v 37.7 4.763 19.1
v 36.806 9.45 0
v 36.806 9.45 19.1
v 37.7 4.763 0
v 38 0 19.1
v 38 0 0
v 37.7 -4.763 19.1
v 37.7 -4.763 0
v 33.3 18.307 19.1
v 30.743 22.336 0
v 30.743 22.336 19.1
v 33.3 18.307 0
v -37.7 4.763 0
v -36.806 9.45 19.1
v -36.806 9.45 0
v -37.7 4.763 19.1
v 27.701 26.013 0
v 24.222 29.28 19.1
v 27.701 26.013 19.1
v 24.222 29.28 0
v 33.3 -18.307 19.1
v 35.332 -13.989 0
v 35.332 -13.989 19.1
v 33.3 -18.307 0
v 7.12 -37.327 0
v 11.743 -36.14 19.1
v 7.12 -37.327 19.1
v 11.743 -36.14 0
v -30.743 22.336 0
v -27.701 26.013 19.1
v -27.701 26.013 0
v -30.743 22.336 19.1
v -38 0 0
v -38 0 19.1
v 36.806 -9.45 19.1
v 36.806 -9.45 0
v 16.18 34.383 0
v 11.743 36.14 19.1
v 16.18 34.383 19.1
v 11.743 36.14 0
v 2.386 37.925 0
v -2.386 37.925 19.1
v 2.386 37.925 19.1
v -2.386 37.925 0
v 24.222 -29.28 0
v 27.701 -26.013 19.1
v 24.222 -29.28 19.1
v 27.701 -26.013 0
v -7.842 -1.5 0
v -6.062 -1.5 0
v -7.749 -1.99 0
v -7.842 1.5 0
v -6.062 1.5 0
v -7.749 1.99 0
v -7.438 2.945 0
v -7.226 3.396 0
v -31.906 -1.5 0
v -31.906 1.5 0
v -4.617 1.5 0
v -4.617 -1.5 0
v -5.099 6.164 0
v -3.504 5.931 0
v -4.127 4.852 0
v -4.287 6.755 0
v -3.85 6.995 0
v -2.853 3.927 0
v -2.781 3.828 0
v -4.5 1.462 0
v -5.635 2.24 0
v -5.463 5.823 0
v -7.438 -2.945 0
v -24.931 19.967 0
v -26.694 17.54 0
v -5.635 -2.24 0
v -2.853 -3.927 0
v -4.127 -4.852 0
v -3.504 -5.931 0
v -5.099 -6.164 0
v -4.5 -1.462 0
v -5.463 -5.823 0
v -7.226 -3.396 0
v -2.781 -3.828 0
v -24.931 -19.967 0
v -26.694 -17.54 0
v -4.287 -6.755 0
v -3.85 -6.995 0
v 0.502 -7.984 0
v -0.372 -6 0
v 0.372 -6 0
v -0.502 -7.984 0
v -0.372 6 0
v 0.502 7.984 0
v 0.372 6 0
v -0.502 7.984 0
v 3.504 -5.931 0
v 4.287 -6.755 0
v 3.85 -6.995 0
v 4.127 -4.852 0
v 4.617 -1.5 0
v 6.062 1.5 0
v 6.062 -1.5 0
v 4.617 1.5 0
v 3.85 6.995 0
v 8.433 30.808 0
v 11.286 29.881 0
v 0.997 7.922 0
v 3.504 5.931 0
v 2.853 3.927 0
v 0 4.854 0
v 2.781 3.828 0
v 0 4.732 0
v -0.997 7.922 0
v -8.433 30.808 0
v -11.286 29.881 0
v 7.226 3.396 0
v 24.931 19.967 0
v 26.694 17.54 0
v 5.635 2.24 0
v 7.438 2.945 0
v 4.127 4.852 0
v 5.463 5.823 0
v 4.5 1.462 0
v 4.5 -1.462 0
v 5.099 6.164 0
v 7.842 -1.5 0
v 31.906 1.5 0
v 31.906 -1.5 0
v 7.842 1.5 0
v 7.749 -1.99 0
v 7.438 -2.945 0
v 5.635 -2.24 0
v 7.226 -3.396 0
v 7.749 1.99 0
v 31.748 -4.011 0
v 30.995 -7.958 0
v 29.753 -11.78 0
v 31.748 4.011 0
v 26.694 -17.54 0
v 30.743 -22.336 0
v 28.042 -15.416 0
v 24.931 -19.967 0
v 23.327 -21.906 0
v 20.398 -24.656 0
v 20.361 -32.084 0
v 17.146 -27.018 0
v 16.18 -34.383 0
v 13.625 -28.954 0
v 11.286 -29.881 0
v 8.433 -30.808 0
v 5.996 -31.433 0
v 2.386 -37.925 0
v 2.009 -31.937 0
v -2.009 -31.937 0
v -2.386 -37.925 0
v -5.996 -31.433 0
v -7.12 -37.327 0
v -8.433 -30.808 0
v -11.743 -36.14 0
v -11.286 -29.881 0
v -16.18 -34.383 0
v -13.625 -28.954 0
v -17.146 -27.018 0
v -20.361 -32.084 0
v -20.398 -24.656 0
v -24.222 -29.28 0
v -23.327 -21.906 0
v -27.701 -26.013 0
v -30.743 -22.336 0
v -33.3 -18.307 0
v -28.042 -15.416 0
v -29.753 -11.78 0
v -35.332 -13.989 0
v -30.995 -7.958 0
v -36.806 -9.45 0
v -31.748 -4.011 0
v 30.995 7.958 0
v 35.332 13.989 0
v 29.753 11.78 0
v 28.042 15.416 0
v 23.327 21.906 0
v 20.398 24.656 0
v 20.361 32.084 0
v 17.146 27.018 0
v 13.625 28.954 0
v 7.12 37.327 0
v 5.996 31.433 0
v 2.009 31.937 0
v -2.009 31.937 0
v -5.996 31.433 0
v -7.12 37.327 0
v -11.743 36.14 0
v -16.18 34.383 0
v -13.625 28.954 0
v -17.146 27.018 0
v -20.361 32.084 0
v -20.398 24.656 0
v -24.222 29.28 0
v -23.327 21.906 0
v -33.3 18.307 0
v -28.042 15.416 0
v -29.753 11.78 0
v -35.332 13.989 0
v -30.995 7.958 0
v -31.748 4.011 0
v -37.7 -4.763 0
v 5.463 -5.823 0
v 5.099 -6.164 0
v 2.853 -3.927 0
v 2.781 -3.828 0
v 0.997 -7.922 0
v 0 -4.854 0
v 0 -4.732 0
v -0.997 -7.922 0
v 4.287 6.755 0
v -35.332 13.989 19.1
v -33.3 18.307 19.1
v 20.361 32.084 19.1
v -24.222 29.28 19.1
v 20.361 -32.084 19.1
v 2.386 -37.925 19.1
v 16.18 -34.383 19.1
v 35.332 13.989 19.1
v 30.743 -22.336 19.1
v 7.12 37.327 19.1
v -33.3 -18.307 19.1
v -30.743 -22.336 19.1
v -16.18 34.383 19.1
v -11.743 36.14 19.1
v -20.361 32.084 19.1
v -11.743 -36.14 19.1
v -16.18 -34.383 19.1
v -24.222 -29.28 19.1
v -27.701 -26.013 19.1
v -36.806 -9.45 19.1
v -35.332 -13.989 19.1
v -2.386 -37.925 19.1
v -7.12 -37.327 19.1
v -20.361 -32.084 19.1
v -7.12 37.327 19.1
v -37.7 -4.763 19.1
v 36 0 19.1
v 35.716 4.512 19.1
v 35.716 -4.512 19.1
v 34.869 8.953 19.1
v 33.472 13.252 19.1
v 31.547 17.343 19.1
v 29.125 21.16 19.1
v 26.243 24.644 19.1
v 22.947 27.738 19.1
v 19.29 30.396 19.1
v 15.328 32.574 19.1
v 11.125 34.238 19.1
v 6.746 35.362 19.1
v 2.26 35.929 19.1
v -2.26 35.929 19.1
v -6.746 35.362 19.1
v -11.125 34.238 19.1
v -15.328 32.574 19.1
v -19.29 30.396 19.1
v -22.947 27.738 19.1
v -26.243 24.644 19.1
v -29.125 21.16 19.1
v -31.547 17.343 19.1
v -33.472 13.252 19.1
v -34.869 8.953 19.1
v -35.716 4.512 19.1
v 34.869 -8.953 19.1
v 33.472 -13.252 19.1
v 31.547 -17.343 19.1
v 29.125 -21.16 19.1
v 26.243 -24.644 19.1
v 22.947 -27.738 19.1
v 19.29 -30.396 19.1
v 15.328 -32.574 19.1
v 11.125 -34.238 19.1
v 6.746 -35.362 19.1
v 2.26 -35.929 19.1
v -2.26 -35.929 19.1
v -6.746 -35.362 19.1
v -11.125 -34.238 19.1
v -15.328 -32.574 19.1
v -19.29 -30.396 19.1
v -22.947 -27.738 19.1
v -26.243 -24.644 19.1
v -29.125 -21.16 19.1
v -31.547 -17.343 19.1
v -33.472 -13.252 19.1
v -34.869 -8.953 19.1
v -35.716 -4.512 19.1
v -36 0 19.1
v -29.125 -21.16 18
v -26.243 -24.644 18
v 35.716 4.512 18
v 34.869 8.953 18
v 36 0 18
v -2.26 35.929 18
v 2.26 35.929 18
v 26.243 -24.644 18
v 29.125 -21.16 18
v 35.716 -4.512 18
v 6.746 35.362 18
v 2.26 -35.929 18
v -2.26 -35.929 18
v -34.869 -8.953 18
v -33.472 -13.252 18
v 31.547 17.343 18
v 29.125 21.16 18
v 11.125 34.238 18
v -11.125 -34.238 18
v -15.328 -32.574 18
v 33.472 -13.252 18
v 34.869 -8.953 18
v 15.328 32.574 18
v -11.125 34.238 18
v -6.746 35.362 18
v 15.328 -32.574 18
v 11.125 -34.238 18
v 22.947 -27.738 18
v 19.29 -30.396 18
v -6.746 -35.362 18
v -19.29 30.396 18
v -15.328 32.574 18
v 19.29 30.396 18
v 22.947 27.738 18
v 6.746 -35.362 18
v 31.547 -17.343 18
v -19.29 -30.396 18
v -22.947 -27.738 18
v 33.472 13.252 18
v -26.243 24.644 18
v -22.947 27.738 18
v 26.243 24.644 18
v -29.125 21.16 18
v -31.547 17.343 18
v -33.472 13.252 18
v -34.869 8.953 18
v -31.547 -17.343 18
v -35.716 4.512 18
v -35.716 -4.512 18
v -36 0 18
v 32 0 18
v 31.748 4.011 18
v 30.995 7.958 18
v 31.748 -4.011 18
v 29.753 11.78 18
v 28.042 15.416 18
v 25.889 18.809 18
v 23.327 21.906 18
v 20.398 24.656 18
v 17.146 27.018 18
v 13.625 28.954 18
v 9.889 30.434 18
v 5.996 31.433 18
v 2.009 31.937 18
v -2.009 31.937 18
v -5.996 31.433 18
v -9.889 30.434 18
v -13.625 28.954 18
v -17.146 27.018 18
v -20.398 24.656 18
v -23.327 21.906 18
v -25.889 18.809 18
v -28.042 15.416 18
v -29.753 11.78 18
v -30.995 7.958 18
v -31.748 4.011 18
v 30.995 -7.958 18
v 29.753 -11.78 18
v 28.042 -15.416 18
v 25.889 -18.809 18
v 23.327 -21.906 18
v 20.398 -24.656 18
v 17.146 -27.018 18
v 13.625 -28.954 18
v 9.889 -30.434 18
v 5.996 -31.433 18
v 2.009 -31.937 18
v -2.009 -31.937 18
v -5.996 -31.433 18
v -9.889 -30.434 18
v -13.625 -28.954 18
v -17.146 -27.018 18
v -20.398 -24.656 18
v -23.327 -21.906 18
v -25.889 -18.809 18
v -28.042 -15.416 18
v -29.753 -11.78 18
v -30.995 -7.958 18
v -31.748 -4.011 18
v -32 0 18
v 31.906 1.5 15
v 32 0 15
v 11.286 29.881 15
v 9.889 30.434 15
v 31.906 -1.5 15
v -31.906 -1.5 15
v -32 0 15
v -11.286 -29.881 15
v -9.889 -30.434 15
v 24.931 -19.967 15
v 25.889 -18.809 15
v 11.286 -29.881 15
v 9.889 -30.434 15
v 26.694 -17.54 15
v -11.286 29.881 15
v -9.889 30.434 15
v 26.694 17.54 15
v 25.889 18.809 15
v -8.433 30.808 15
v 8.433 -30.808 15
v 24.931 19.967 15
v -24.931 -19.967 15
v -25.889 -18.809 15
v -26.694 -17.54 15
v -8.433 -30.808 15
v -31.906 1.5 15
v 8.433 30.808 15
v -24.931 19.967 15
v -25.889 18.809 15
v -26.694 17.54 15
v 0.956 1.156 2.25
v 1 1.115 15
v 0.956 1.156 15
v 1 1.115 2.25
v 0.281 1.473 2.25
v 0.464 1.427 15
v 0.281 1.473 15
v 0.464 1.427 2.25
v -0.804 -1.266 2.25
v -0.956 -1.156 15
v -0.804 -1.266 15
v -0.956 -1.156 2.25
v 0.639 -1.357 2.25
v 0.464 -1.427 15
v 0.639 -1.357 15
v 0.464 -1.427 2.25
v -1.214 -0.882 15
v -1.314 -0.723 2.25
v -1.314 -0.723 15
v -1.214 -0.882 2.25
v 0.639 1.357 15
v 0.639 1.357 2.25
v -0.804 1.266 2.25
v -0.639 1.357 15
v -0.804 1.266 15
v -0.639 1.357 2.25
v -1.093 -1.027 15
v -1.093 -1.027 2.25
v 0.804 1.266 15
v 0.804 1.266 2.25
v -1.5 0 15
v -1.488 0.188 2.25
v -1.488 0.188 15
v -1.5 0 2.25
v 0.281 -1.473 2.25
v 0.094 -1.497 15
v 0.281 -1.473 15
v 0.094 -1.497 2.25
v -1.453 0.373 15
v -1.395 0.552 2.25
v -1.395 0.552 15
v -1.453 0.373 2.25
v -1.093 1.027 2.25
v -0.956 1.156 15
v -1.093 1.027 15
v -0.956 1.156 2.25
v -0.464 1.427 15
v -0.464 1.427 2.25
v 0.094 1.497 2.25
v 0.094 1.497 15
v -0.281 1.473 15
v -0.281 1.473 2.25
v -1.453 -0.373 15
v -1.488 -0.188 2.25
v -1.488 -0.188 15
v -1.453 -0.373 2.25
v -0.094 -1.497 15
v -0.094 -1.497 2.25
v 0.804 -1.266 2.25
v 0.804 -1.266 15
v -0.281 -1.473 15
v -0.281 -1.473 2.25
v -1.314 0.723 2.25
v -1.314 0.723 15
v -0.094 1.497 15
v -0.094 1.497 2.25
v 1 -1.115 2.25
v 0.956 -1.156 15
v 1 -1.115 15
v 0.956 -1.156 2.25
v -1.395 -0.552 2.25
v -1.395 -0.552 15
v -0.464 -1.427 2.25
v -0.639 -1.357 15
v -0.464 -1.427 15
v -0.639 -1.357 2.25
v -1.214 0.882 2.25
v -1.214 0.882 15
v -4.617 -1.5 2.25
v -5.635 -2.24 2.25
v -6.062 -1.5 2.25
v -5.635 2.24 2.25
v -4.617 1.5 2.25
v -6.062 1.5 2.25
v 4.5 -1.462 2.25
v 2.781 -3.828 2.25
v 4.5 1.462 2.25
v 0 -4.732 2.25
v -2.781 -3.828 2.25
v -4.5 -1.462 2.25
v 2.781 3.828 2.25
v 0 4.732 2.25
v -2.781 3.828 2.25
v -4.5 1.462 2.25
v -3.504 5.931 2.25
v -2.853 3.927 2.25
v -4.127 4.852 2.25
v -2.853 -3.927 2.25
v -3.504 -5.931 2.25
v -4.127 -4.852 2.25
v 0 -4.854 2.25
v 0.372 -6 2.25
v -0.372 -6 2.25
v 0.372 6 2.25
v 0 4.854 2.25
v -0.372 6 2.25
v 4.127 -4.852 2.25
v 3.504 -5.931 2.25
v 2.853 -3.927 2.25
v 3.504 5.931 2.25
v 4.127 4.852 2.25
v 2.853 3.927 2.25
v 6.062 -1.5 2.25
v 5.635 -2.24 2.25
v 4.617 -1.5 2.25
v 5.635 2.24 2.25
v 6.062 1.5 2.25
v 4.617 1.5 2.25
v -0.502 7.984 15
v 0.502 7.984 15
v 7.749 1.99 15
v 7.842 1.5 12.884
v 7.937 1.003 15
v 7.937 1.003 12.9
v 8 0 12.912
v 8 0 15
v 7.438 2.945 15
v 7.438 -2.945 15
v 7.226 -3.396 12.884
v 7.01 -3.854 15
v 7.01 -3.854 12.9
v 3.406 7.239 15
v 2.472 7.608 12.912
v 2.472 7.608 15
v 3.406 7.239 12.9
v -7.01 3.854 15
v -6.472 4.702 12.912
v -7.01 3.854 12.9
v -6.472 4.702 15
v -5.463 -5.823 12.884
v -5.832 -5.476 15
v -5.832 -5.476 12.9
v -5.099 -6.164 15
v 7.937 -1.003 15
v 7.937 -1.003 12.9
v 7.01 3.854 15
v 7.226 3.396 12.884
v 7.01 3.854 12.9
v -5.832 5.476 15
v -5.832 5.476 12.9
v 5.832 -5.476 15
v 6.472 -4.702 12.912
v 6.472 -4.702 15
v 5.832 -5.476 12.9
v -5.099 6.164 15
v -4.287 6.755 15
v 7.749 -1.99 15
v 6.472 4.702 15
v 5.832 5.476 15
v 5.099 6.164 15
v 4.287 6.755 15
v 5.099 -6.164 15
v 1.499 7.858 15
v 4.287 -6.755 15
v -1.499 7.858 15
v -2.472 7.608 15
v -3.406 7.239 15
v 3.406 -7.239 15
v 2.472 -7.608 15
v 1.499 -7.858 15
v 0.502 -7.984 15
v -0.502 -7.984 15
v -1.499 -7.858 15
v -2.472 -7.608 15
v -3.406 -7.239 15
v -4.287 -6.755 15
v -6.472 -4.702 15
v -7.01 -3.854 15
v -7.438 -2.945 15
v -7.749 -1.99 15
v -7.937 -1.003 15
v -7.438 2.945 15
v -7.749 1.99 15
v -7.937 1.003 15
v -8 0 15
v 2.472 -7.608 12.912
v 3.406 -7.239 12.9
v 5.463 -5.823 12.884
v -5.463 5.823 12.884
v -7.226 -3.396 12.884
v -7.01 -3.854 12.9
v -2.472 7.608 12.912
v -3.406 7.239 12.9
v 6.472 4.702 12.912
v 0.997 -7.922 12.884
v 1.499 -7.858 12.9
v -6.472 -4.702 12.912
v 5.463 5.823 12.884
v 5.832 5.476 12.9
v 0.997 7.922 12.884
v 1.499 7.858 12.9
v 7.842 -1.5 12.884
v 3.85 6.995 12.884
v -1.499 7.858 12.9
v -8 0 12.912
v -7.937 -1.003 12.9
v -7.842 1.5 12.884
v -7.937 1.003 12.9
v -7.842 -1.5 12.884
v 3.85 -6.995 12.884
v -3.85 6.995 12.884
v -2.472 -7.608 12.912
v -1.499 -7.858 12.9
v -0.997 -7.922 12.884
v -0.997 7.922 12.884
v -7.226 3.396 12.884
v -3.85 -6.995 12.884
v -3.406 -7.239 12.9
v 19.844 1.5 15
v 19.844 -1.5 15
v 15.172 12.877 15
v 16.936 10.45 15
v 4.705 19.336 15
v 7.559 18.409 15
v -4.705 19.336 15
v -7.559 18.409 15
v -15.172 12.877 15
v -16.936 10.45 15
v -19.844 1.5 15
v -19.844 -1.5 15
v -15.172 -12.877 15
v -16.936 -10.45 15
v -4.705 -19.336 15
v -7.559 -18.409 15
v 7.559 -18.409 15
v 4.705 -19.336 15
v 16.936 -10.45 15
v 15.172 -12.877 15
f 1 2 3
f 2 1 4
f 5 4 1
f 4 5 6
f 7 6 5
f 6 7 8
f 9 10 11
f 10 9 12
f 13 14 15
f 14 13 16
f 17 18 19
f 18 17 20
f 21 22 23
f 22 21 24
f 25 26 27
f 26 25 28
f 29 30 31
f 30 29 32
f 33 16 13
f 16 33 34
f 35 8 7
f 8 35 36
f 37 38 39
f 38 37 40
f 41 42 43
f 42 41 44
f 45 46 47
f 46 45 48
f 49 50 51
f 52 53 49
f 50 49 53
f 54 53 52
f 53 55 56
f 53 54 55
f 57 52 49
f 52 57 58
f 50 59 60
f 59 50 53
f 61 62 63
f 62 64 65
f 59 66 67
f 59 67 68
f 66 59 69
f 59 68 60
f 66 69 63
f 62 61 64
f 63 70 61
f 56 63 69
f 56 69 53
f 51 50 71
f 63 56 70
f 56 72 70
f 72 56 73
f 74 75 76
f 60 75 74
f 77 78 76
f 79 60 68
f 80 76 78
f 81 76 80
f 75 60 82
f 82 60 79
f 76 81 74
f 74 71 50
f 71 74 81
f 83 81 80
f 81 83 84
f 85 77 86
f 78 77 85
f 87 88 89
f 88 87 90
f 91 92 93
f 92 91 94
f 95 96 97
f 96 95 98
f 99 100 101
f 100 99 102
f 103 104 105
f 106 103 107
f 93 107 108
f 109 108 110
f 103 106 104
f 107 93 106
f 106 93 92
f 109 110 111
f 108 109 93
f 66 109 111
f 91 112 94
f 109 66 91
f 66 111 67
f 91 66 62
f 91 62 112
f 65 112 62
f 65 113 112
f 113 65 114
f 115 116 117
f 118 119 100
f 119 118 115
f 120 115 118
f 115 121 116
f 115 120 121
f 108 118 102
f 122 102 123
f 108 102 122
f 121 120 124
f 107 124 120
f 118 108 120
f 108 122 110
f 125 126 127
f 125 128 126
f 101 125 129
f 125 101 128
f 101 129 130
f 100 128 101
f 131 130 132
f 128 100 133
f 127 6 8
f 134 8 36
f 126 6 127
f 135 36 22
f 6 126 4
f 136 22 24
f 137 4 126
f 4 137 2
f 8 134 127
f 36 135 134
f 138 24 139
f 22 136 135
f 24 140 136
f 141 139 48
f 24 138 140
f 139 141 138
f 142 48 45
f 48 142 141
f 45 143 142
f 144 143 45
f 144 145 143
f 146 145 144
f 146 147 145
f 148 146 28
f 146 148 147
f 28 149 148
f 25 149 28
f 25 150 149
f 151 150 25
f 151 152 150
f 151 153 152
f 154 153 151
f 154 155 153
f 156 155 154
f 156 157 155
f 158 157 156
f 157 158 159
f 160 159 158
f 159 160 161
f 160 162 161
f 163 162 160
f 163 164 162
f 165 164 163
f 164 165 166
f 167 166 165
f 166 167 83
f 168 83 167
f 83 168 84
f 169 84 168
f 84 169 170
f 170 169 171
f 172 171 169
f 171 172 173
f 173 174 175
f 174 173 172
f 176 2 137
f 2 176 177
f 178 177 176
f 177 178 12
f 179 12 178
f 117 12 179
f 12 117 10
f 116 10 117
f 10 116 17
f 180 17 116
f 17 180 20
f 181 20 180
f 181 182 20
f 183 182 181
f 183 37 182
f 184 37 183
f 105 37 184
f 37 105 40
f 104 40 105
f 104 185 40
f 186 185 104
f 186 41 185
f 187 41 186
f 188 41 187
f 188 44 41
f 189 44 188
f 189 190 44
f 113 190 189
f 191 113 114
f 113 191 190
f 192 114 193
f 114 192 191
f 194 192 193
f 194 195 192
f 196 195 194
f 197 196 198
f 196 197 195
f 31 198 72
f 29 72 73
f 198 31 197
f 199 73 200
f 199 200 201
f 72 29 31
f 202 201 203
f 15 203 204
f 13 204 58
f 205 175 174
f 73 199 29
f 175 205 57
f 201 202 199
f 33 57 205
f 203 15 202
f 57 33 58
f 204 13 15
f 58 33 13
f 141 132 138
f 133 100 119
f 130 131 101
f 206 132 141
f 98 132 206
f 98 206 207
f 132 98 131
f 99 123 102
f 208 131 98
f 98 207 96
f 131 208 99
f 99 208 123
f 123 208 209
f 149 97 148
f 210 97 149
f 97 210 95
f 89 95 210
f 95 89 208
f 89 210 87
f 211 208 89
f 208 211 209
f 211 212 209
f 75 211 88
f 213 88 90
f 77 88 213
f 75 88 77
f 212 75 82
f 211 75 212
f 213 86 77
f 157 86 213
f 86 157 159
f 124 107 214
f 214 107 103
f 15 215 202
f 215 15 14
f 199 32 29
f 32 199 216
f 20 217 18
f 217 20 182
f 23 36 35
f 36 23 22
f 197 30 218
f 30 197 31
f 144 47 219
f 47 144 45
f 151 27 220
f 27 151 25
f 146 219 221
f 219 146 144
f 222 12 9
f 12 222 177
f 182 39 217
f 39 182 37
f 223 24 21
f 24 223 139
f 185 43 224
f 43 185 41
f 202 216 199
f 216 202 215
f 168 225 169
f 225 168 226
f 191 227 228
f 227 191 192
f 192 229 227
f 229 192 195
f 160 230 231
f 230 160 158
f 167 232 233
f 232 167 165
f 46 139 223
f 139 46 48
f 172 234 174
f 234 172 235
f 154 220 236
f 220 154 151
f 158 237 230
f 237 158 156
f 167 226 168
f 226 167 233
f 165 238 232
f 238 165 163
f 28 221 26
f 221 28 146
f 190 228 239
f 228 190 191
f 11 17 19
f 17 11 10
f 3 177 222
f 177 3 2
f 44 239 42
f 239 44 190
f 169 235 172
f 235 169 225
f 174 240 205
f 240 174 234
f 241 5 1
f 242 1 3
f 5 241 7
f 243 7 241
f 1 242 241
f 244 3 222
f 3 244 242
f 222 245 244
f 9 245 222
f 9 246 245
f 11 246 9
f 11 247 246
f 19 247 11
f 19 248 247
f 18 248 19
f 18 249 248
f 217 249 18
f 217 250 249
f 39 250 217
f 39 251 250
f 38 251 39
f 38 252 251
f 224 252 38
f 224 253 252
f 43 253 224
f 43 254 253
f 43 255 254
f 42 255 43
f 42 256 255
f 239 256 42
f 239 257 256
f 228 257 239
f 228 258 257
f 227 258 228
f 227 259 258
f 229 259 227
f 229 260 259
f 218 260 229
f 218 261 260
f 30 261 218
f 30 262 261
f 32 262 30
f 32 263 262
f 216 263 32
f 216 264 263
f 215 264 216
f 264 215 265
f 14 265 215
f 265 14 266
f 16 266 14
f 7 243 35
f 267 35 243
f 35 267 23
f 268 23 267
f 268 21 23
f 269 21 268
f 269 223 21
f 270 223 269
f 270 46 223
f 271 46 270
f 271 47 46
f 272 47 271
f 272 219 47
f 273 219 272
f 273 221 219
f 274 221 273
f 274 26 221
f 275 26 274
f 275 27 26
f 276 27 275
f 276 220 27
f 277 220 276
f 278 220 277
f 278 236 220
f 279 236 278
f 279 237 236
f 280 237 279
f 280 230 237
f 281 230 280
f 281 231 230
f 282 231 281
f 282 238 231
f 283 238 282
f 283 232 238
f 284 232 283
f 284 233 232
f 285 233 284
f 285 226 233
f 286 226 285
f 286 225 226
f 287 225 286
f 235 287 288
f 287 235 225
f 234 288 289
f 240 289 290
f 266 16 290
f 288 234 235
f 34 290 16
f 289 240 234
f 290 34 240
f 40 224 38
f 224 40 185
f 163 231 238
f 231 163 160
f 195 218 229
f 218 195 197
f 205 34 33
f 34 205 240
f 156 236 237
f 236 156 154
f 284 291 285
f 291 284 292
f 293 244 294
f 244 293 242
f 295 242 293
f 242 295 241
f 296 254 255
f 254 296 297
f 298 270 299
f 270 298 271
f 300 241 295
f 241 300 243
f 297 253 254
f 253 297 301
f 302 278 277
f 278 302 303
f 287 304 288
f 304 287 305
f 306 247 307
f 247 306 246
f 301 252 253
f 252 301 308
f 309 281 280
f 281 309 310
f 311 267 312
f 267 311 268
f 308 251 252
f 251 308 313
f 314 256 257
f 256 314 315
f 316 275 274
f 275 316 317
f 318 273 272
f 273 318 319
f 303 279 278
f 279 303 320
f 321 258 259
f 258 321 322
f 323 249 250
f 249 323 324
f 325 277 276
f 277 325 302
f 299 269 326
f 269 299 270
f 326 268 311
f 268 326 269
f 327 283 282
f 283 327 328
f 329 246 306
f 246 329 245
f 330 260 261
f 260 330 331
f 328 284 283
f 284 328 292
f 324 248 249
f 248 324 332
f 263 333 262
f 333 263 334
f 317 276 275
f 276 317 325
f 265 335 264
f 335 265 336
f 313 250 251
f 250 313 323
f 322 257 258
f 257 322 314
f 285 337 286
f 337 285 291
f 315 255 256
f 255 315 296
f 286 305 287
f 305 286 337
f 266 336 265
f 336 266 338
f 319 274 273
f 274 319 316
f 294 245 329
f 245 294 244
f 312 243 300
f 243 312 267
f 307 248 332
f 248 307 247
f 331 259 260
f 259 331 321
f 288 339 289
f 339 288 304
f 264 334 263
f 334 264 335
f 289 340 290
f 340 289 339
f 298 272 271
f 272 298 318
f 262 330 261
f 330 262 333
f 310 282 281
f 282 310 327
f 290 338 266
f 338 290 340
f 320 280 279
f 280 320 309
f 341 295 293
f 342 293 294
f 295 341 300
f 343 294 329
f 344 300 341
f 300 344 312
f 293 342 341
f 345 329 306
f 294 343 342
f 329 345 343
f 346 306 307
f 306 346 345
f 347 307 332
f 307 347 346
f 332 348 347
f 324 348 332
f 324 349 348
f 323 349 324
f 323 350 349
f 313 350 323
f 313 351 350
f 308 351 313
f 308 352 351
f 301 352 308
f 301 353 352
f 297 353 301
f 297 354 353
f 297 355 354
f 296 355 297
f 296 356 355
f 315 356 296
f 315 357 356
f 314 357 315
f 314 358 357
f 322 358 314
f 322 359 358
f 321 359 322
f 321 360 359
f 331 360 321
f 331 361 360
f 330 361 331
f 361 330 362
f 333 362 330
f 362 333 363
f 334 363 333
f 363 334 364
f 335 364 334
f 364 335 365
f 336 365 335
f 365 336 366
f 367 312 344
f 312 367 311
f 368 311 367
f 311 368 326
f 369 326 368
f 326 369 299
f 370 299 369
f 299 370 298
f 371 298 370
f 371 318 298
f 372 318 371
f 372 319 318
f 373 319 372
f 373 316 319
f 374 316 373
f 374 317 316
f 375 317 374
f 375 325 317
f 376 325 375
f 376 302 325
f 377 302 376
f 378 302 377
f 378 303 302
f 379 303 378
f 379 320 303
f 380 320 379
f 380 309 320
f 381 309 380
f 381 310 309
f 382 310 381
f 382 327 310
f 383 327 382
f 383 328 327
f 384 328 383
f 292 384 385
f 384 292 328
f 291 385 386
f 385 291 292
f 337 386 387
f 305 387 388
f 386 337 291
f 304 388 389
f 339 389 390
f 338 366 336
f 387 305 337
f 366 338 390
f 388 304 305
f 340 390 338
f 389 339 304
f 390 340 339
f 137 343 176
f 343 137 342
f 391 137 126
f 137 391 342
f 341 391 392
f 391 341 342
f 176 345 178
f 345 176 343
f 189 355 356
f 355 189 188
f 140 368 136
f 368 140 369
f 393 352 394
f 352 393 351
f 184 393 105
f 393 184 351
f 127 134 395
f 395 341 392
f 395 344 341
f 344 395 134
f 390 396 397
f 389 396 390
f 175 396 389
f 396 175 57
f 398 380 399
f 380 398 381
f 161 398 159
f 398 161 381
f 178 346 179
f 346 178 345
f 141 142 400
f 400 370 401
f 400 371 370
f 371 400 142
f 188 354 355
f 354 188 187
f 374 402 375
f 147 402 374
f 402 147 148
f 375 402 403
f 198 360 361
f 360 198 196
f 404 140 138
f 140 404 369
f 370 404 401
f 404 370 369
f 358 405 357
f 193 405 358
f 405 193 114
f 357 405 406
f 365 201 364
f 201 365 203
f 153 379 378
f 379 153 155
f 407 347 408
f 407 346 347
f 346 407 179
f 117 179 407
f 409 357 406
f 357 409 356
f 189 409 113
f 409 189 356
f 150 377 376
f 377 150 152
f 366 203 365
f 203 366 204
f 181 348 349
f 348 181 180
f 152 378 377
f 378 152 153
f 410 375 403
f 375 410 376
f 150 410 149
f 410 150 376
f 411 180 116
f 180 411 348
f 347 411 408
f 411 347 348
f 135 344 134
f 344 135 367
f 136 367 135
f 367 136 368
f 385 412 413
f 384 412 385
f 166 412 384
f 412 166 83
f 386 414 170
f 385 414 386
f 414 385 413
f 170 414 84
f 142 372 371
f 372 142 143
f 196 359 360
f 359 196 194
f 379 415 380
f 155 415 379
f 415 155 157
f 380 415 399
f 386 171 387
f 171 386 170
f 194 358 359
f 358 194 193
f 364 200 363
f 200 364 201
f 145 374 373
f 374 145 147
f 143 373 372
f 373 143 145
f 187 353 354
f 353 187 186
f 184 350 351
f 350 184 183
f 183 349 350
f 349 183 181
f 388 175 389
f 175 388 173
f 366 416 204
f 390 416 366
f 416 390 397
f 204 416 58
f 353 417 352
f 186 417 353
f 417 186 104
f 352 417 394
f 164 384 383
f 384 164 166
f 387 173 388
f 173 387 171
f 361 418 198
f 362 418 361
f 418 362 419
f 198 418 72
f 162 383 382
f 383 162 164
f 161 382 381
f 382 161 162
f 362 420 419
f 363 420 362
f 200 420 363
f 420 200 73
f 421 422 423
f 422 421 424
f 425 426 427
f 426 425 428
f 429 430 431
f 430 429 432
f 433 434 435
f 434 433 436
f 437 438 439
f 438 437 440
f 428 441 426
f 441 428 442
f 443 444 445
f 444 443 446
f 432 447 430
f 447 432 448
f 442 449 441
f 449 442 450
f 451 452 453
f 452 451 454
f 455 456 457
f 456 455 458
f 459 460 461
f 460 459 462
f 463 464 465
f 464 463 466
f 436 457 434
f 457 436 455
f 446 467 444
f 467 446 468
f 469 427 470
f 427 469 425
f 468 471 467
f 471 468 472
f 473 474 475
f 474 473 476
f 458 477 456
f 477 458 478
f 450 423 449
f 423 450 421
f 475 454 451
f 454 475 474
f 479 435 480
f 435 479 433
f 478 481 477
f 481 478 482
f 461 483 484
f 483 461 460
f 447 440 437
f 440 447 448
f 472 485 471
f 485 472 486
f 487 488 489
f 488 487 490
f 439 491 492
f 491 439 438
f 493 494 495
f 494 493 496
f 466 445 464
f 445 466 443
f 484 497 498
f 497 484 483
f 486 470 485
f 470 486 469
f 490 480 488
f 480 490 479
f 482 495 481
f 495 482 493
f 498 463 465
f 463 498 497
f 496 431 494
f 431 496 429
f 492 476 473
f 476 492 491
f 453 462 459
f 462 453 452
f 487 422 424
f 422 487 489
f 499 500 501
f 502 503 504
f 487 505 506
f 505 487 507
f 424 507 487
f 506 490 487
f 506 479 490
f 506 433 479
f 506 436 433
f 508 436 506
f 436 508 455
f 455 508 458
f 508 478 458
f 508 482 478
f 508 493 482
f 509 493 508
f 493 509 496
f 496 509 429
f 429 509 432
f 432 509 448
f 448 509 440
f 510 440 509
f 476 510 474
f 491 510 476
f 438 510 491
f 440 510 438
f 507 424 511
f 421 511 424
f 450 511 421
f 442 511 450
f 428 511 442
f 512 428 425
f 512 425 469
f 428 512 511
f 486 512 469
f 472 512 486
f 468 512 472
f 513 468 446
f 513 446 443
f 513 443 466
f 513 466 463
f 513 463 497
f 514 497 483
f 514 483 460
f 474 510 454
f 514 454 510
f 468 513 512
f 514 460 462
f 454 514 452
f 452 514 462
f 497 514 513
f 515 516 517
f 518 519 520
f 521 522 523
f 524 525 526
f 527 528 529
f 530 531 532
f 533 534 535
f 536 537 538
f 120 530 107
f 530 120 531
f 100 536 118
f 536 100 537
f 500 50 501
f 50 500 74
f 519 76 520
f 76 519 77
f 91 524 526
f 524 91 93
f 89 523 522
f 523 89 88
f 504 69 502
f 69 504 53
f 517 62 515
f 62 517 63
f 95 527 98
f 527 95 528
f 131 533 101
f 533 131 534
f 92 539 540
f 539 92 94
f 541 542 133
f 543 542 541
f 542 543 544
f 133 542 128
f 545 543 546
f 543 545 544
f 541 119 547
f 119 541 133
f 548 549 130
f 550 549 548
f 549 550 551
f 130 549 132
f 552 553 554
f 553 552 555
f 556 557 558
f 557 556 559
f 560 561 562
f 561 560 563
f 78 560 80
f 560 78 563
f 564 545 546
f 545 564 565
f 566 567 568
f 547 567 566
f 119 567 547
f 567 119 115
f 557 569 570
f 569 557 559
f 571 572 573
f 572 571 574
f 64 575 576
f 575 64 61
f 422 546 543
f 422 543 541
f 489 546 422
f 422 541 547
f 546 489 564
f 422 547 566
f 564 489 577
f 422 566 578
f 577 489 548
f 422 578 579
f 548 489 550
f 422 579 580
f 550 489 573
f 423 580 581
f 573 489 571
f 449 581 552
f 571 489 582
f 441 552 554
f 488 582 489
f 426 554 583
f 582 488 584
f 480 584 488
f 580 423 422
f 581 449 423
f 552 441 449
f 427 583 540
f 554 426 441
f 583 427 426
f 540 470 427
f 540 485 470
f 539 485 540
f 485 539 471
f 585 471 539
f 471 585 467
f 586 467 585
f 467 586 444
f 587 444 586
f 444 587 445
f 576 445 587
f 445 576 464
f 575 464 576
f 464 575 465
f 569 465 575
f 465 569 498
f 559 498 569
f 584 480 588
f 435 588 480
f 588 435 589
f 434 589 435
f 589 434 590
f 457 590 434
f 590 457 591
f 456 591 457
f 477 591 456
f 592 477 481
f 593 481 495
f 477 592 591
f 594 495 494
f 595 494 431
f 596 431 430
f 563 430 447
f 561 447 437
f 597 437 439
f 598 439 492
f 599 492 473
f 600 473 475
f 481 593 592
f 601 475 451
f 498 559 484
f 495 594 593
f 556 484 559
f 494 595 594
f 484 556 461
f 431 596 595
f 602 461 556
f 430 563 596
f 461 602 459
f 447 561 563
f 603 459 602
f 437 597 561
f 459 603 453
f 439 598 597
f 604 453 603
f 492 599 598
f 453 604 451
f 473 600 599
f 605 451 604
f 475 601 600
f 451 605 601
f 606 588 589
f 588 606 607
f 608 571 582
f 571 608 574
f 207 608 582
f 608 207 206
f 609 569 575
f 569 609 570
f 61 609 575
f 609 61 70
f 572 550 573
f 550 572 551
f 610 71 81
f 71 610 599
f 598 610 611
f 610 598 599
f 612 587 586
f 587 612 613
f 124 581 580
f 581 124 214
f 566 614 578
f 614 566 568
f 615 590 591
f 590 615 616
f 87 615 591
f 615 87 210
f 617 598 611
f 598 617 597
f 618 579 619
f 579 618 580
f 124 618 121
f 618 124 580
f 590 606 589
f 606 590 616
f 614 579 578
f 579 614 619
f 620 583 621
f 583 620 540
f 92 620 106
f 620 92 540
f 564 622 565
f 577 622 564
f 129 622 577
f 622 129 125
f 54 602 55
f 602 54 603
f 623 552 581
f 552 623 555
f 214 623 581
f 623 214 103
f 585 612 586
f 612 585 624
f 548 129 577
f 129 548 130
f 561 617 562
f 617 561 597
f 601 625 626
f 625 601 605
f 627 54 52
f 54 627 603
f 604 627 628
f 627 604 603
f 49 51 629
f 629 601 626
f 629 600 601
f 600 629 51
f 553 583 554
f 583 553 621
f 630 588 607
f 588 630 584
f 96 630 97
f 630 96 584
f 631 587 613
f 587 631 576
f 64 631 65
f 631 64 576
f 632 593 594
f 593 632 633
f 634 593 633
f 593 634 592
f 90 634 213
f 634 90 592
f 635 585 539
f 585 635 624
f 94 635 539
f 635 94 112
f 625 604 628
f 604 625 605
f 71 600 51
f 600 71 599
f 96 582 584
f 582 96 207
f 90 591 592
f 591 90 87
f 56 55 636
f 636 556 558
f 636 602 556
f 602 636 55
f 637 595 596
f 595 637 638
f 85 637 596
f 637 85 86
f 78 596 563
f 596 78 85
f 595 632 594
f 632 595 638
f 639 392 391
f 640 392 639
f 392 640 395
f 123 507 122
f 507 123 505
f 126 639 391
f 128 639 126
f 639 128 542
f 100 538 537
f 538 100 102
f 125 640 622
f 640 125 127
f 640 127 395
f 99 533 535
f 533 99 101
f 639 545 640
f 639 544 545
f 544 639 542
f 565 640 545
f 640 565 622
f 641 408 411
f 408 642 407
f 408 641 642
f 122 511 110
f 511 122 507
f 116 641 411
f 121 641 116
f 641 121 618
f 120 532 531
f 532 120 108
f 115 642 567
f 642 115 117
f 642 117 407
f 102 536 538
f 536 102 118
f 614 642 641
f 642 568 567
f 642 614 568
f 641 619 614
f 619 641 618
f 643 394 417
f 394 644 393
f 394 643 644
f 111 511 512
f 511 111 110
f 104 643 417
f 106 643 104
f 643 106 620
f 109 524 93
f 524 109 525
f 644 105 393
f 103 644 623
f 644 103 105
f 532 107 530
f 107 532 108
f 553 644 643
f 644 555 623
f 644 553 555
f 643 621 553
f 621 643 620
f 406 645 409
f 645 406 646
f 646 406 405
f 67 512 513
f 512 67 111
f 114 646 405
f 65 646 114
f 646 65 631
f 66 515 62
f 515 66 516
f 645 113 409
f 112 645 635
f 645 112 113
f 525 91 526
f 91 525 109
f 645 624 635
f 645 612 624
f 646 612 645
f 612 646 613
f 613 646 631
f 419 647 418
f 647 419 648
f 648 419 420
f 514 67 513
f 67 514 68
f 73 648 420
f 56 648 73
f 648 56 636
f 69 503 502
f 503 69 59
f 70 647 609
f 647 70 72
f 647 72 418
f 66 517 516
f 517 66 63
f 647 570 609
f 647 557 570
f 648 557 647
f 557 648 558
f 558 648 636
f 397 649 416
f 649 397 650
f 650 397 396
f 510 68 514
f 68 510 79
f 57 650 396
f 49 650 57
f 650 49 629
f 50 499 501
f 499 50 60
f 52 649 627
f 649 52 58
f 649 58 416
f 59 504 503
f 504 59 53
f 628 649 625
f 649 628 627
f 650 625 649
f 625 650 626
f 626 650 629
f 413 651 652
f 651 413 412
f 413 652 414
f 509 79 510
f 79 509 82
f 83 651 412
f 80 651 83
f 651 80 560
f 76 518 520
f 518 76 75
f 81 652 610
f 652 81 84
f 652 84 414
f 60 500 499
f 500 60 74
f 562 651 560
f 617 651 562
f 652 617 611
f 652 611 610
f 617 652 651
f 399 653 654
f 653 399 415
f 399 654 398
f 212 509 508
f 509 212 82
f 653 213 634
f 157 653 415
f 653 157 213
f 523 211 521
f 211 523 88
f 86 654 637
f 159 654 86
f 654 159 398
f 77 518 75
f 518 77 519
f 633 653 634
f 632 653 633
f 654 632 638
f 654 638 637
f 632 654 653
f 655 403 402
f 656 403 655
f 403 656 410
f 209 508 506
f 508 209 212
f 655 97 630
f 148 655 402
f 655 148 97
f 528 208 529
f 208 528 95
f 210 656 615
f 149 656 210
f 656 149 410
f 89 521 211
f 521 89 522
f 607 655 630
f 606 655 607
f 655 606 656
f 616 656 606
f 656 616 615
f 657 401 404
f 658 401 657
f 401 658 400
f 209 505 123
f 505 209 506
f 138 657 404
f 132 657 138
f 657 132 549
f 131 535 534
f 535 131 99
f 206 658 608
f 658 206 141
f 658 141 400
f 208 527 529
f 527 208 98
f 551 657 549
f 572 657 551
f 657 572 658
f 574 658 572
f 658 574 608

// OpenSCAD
wheel_width = 19.1;

rim_external_radius = 38;
rim_thickness = 2;

inner_rim_thickness = 4;
inner_rim_height = 18;

hub_height = 15;
hub_radius = 5;

shaft_radius = 1.5;
shaft_flat = true;
shaft_flat_offset=1;

12mm_hex_drive = true;

spoke_type = 1; // 1 = parallel 2= wedge
num_spokes = 10;
spoke_thickness = 3;
spoke_height = 15;
spoke_angle = -10;

// size is the XY plane size, height in Z
module hexagon(size, height) {
  boxWidth = size/1.75;
  for (r = [-60, 0, 60]) rotate([0,0,r]) cube([boxWidth, size, height], true);
}


union(){
// outer rim
difference()
{
    cylinder(wheel_width,rim_external_radius,rim_external_radius, $fn=50);  // outer rim
 
    translate([0,0,-1])
    {     // inner rim
        cylinder(wheel_width+2, rim_external_radius-                rim_thickness,rim_external_radius-                  rim_thickness, $fn=50);
    }
}

// inner rim
difference()
{
    cylinder(inner_rim_height,rim_external_radius-rim_thickness,rim_external_radius-rim_thickness, $fn=50);  // outer rim
 
    translate([0,0,-1]){     // inner rim
        cylinder(wheel_width+2, rim_external_radius-rim_thickness-inner_rim_thickness,rim_external_radius-rim_thickness-inner_rim_thickness, $fn=50);
    }
}

// hub
difference()
{
    if (12mm_hex_drive == true)
    {
        if (hub_radius < 8)
        {
            hub_radius =8;
             cylinder(hub_height,hub_radius,8, $fn=50);  // outer hub
        }
        else
        {
             cylinder(hub_height,hub_radius,hub_radius, $fn=50);  // outer hub
        }
    }
   
 
    translate([0,0,-1])
    {   
        // inner hub
        difference()
        {
            cylinder(wheel_width+2,shaft_radius, shaft_radius, $fn=50); 
            //flat on shaft
            if (shaft_flat == true)
            {
                translate([shaft_radius+shaft_flat_offset,0,15])
                {
                    cube([shaft_radius*2
                    ,shaft_radius*2,29], true); //shaft diameter
                }
            }   
        }
    }
    if (12mm_hex_drive == true)
    {
        hexagon(12,4.5);
    }
}



step_angle = 360/num_spokes;
for (angle = [0: step_angle: 360])
{
    rotate ( angle)
    {
        if (spoke_type == 1) // original
        {
            translate([(rim_external_radius-rim_thickness-hub_radius)/2+hub_radius,0,           spoke_height/2]) 
            {
                difference()
                {
                    cube([rim_external_radius-rim_thickness-hub_radius+1,spoke_thickness,                   spoke_height], true);  // fudge
                    rotate([0,spoke_angle,0])
                    {
                        translate([0,0,spoke_height])
                        {
                            cube([rim_external_radius-rim_thickness-hub_radius+1,spoke_thickness+1,spoke_height], true);  // fudge
                        }
                    }
                }
            }
        }
        else
        { 
            if (spoke_type ==2)  // parallel
            {
                rotate([90,0,0])
                {
        
                    linear_extrude(1.5, center = true)
                    {
                        polygon( [[hub_radius-0.5,0], [rim_external_radius-rim_thickness-                       inner_rim_thickness+0.5,0],
                            [rim_external_radius-rim_thickness-inner_rim_thickness+0.5,                         inner_rim_height],[hub_radius-0.5, hub_height-0.5]]);
                    }
                }
            }
            else
            {
                if (spoke_type ==3) // wedge
                {
                    rotate_extrude(angle = spoke_thickness * 4, $fn=50)
                    {   
                        /*polygon( [[hub_radius-0.5,0], [rim_external_radius-rim_thickness-                       inner_rim_thickness+0.5,0],
                           [rim_external_radius-rim_thickness-inner_rim_thickness+0.5,                      inner_rim_height],
                            [hub_radius-0.5, hub_height-0.5]]);*/
                        polygon( [[hub_radius-0.5, 0], [rim_external_radius-rim_thickness-                       inner_rim_thickness+0.5,0],
                           [rim_external_radius-rim_thickness-inner_rim_thickness+0.5,                      inner_rim_height],
                            [hub_radius-0.5, hub_height-0.5]]);
                    }
                }
            }
        }
    }
}

}
